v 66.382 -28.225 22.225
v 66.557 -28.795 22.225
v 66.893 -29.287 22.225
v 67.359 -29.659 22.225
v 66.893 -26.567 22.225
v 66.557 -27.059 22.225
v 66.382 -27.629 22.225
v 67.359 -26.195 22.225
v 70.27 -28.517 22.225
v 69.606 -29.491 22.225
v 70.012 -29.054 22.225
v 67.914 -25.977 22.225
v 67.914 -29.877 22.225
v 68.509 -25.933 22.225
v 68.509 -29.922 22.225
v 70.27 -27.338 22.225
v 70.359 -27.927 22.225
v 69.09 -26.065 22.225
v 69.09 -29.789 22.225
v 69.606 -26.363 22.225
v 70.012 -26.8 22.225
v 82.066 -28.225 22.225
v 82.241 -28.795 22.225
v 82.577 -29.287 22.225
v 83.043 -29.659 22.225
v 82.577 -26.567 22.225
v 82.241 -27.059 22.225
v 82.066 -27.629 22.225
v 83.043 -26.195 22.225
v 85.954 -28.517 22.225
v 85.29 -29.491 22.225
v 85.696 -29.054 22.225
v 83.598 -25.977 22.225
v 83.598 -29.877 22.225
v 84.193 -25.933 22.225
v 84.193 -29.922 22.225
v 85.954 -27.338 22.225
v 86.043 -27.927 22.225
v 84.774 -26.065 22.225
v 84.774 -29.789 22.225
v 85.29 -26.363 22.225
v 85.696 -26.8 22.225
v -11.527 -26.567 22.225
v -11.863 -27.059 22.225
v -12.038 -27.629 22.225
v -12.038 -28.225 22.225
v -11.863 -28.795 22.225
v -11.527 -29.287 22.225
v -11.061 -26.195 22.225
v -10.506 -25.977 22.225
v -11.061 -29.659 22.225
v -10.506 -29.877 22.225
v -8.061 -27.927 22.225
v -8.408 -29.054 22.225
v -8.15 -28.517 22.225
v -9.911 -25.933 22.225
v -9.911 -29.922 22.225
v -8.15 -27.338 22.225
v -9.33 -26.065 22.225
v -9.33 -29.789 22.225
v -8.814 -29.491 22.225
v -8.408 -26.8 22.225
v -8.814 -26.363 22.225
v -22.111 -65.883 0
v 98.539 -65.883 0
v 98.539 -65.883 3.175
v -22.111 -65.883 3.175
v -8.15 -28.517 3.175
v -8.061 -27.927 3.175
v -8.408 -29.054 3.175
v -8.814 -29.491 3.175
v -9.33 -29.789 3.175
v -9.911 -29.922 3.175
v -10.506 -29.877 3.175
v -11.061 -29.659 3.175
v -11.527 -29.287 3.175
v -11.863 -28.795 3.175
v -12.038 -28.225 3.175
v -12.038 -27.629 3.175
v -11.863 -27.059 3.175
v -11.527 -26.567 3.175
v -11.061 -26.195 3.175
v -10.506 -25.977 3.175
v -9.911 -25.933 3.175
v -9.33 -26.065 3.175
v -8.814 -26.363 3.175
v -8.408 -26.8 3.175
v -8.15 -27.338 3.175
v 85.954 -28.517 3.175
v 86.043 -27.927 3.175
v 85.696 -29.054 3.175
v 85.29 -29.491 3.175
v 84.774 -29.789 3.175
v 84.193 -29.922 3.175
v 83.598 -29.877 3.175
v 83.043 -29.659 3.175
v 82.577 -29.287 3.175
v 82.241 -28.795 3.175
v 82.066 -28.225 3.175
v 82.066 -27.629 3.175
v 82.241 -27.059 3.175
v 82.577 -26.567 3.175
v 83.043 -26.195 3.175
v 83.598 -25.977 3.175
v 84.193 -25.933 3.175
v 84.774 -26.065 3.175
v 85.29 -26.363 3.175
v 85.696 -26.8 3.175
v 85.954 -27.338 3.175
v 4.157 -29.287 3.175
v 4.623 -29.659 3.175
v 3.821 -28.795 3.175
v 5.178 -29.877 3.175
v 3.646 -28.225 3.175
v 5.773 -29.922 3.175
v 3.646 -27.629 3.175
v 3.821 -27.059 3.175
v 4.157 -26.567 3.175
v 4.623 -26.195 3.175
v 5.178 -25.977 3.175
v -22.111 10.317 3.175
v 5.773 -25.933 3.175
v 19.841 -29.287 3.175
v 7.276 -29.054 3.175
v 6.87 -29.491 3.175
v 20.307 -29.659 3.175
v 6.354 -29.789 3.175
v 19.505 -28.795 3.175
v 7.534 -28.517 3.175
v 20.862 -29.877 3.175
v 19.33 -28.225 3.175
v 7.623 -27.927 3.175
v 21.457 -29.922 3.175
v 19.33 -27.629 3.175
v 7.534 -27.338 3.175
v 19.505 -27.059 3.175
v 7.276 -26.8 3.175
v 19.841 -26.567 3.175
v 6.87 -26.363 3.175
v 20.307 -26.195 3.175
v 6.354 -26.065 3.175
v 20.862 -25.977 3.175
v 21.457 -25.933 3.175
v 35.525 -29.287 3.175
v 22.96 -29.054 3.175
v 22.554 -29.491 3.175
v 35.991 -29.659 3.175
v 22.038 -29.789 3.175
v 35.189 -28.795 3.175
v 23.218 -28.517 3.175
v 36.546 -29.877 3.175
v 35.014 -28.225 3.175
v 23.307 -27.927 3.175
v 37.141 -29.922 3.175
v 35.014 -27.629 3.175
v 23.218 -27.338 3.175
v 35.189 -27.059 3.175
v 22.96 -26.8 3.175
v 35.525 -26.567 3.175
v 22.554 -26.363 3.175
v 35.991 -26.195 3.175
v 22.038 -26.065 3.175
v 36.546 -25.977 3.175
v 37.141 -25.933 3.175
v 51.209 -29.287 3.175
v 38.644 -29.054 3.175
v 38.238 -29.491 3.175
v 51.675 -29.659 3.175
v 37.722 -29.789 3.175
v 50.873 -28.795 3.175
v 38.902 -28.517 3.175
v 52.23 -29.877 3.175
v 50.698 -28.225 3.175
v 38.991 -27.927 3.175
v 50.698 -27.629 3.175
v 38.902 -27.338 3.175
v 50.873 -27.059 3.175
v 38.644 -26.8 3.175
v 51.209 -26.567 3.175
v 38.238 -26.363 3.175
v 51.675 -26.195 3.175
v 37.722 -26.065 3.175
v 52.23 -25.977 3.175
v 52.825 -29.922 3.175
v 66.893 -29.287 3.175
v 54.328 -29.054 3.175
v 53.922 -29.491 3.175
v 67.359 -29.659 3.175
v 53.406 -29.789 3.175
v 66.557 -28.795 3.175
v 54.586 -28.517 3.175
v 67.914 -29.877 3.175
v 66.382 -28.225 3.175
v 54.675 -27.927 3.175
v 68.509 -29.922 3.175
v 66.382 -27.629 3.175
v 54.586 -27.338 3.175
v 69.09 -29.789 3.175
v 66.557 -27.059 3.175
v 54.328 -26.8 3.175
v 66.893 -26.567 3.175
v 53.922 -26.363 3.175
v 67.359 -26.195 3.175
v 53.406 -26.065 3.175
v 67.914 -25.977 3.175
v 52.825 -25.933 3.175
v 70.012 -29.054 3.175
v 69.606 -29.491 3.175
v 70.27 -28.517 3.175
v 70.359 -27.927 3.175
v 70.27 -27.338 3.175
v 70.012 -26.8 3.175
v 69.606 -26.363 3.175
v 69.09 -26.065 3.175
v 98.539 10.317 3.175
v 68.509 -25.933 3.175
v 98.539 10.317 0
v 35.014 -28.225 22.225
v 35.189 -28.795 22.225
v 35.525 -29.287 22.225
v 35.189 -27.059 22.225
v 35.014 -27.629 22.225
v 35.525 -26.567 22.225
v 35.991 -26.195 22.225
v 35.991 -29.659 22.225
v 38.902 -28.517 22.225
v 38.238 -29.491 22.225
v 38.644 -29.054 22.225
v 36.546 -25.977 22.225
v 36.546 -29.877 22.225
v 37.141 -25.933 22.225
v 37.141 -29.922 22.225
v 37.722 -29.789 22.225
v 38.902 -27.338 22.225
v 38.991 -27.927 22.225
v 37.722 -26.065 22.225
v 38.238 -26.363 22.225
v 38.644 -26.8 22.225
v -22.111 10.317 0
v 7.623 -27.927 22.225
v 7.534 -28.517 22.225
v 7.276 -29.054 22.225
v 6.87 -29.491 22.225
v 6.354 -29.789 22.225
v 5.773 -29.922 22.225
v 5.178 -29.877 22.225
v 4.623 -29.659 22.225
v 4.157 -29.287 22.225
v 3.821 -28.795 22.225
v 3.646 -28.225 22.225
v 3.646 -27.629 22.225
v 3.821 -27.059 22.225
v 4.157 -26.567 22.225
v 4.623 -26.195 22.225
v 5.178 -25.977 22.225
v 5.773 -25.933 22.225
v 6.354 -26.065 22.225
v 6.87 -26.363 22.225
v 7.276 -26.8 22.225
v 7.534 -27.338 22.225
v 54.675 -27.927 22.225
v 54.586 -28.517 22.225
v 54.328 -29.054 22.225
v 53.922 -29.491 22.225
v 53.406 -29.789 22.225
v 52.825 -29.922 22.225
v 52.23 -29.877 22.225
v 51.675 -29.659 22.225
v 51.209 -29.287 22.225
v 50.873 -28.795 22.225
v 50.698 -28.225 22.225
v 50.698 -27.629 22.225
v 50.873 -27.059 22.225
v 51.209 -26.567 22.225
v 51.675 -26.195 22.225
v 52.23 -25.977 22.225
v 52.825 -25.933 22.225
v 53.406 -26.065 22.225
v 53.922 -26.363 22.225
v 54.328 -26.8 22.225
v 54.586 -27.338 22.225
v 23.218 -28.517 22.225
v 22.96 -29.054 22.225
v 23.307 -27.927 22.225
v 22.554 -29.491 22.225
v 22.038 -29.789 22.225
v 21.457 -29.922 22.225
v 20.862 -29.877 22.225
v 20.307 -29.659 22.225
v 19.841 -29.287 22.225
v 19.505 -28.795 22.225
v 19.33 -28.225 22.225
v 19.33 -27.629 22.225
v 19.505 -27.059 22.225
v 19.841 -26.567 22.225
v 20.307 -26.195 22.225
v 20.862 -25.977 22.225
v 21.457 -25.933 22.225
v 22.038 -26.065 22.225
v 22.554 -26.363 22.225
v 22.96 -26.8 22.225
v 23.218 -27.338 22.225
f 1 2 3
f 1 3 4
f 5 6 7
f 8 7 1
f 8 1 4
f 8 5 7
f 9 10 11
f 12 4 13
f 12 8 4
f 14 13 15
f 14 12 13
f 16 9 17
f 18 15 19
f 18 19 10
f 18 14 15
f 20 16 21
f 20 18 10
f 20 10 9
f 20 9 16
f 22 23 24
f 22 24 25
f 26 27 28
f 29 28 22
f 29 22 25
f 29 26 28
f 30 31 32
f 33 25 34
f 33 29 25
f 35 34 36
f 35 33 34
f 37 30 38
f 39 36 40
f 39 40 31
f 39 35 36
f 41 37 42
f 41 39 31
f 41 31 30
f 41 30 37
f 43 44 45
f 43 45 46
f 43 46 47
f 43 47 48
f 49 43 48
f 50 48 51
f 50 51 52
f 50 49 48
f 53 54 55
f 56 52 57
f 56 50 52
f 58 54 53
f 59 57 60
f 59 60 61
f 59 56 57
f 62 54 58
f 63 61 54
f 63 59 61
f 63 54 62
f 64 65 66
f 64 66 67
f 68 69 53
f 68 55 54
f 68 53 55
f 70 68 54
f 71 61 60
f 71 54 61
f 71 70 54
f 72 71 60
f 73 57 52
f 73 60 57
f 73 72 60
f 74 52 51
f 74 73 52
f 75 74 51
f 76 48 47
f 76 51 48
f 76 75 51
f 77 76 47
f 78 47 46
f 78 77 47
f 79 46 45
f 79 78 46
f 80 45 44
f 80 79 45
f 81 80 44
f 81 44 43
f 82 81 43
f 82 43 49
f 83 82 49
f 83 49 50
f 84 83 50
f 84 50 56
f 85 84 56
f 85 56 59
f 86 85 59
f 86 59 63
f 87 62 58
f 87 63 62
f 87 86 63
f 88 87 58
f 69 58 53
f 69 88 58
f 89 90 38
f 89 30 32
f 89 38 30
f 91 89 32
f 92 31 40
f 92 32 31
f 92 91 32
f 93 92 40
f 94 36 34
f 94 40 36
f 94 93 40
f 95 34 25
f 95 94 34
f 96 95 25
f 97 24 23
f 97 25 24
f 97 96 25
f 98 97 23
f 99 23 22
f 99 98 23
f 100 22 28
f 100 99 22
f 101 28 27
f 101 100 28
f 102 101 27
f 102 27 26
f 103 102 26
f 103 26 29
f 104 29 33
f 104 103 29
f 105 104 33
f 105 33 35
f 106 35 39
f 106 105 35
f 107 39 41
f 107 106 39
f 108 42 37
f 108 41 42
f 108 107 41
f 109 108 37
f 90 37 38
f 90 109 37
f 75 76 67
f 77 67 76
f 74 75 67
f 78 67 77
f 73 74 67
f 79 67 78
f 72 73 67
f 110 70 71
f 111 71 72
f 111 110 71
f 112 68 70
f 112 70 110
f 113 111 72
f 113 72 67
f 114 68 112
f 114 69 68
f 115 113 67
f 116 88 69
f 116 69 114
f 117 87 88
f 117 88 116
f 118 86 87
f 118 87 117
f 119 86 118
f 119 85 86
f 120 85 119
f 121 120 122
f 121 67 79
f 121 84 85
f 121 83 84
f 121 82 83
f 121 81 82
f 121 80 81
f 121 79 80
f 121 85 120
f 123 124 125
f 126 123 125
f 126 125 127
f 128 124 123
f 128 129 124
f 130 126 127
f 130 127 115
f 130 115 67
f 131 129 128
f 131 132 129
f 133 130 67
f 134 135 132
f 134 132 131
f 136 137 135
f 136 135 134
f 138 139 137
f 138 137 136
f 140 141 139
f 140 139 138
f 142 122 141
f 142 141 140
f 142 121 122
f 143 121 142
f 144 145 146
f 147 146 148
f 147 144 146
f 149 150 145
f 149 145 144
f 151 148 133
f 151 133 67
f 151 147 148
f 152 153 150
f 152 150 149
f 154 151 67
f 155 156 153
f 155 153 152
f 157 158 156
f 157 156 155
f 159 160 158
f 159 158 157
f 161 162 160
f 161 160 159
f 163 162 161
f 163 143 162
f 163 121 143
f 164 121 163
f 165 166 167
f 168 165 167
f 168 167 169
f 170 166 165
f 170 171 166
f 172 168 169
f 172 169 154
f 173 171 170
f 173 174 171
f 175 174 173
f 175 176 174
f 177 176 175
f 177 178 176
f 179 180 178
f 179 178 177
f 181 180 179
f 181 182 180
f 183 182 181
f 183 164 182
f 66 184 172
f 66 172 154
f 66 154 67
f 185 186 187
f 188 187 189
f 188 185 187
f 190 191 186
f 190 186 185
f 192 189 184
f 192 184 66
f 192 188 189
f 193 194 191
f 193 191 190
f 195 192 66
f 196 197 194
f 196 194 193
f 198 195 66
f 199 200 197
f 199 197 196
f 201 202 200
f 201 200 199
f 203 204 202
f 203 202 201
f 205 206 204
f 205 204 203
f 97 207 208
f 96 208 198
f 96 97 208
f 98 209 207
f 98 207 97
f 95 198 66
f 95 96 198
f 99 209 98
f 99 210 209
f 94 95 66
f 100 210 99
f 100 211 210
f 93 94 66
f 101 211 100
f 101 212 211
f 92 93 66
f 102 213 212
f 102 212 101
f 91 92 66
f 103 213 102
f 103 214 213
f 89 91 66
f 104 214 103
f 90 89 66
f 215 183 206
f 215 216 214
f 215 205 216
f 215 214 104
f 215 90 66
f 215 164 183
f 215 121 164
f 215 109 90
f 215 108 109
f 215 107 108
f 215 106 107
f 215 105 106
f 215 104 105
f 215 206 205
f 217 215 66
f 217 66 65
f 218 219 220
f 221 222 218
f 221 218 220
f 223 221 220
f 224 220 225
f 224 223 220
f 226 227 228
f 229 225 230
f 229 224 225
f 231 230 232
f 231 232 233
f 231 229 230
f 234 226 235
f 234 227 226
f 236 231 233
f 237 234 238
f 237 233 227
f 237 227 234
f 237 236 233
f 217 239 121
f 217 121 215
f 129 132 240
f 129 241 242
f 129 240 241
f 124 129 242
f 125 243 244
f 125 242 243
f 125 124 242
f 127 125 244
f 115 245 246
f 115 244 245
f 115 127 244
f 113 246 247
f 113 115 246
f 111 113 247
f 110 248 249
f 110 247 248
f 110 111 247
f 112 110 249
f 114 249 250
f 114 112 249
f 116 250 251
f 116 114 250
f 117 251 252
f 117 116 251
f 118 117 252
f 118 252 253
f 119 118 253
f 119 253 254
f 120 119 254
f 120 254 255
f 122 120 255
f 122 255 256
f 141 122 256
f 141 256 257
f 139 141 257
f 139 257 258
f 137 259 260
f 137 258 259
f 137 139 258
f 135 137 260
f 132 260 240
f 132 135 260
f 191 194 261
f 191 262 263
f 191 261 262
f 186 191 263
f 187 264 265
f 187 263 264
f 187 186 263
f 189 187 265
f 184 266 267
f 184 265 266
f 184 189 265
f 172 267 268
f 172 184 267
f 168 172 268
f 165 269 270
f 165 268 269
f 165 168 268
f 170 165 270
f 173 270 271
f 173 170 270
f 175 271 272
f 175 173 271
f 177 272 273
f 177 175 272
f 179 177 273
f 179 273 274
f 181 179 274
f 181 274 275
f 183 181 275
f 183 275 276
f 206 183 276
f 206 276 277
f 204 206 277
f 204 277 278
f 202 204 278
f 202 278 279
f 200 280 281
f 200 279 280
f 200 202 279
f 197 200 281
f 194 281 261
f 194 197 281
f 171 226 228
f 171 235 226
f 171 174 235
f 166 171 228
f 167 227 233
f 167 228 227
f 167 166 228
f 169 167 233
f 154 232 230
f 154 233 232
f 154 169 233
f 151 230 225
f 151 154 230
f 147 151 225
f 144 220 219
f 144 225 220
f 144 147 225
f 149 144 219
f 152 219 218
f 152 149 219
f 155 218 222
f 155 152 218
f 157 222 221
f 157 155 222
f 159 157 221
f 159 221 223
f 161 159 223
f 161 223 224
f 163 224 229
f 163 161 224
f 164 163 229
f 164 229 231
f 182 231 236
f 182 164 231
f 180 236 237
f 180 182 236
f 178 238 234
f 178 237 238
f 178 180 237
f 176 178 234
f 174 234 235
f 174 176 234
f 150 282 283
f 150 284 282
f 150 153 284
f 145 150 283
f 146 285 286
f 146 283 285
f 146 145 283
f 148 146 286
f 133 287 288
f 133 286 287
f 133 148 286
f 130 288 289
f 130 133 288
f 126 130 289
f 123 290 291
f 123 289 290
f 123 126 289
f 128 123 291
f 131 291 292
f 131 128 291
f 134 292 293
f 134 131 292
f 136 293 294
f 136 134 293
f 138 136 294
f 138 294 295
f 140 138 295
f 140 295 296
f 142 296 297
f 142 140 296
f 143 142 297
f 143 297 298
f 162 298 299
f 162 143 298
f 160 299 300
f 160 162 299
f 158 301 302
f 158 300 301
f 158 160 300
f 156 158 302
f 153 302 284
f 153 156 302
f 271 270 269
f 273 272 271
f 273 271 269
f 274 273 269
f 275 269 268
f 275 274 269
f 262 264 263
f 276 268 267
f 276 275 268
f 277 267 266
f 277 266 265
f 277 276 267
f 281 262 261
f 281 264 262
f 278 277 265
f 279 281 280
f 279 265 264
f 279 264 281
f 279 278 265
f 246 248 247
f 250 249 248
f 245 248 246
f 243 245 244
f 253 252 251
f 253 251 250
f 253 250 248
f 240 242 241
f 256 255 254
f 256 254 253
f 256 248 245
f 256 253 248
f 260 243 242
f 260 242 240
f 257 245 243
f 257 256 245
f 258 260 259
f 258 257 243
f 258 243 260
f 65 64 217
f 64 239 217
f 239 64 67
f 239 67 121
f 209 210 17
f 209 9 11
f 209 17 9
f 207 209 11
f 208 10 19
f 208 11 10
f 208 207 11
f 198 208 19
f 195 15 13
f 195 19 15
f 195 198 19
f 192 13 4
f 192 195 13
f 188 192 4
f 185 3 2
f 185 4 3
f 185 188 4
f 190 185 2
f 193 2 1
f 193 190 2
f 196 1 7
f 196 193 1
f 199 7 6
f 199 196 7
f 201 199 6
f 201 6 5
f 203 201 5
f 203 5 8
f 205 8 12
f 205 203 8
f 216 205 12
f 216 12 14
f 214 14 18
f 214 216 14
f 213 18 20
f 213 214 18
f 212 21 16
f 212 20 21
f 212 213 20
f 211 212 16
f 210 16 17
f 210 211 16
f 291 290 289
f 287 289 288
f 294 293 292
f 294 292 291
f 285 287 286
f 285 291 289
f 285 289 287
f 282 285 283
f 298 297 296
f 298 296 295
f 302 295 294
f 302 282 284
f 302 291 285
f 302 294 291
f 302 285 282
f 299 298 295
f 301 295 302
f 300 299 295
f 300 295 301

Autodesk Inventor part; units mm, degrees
ref_plane "YZ Plane" through (0, 0, 0) normal (1, 0, 0) x (0, 1, 0)
ref_plane "XZ Plane" through (0, 0, 0) normal (0, 1, 0) x (-1, 0, 0)
ref_plane "XY Plane" through (0, 0, 0) normal (0, 0, 1) x (1, 0, 0)
sketch "Sketch1" plane through (0, 0, 0) normal (0, 0, 1) x (1, 0, 0)
  line L0 (-22.1112, 10.3171) -> (130.2888, 10.3171)
  line L1 (130.2888, 10.3171) -> (130.2888, -65.8829)
  line L2 (130.2888, -65.8829) -> (-22.1112, -65.8829)
  line L3 (-22.1112, -65.8829) -> (-22.1112, 10.3171)
  point P0 (0, 0)
  dimension "d0" = 152.4
  dimension "d1" = 76.2
extrude "Extrusion1" add sketch "Sketch1" along normal blind 3.175
sketch "Sketch2" plane through (0, 0, 3.175) normal (0, 0, 1) x (1, 0, 0)
  circle A0 centre (-10.0607, -27.9271) radius 2
  circle A1 centre (5.6233, -27.9271) radius 2
  circle A2 centre (21.3073, -27.9271) radius 2
  circle A3 centre (36.9913, -27.9271) radius 2
  circle A4 centre (52.6753, -27.9271) radius 2
  circle A5 centre (68.3593, -27.9271) radius 2
  circle A6 centre (84.0433, -27.9271) radius 2
  point P0 (0, 0)
  dimension "d4" = 4
  dimension "d5" = 4
  dimension "d6" = 4
  dimension "d7" = 11.684
  dimension "d8" = 11.684
  dimension "d9" = 4
  dimension "d10" = 11.684
  dimension "d11" = 4
  dimension "d12" = 4
  dimension "d13" = 4
  dimension "d14" = 11.684
  dimension "d15" = 11.684
  dimension "d16" = 11.684
extrude "Extrusion2" add sketch "Sketch2" along normal blind 19.05
sketch "Sketch3" plane through (130.2888, -65.8829, 0) normal (1, 0, 0) x (0, 0, -1)
  line L0 (-11.1509, 83.1688) -> (7.2167, 83.1688)
  line L1 (7.2167, 83.1688) -> (7.2167, -5.5026)
  line L2 (7.2167, -5.5026) -> (-11.1509, -5.5026)
  line L3 (-11.1509, -5.5026) -> (-11.1509, 83.1688)
  point P0 (0, 65.8829)
extrude "Extrusion3" cut sketch "Sketch3" against normal blind 31.75
properties part number "gearbasephonecase"
